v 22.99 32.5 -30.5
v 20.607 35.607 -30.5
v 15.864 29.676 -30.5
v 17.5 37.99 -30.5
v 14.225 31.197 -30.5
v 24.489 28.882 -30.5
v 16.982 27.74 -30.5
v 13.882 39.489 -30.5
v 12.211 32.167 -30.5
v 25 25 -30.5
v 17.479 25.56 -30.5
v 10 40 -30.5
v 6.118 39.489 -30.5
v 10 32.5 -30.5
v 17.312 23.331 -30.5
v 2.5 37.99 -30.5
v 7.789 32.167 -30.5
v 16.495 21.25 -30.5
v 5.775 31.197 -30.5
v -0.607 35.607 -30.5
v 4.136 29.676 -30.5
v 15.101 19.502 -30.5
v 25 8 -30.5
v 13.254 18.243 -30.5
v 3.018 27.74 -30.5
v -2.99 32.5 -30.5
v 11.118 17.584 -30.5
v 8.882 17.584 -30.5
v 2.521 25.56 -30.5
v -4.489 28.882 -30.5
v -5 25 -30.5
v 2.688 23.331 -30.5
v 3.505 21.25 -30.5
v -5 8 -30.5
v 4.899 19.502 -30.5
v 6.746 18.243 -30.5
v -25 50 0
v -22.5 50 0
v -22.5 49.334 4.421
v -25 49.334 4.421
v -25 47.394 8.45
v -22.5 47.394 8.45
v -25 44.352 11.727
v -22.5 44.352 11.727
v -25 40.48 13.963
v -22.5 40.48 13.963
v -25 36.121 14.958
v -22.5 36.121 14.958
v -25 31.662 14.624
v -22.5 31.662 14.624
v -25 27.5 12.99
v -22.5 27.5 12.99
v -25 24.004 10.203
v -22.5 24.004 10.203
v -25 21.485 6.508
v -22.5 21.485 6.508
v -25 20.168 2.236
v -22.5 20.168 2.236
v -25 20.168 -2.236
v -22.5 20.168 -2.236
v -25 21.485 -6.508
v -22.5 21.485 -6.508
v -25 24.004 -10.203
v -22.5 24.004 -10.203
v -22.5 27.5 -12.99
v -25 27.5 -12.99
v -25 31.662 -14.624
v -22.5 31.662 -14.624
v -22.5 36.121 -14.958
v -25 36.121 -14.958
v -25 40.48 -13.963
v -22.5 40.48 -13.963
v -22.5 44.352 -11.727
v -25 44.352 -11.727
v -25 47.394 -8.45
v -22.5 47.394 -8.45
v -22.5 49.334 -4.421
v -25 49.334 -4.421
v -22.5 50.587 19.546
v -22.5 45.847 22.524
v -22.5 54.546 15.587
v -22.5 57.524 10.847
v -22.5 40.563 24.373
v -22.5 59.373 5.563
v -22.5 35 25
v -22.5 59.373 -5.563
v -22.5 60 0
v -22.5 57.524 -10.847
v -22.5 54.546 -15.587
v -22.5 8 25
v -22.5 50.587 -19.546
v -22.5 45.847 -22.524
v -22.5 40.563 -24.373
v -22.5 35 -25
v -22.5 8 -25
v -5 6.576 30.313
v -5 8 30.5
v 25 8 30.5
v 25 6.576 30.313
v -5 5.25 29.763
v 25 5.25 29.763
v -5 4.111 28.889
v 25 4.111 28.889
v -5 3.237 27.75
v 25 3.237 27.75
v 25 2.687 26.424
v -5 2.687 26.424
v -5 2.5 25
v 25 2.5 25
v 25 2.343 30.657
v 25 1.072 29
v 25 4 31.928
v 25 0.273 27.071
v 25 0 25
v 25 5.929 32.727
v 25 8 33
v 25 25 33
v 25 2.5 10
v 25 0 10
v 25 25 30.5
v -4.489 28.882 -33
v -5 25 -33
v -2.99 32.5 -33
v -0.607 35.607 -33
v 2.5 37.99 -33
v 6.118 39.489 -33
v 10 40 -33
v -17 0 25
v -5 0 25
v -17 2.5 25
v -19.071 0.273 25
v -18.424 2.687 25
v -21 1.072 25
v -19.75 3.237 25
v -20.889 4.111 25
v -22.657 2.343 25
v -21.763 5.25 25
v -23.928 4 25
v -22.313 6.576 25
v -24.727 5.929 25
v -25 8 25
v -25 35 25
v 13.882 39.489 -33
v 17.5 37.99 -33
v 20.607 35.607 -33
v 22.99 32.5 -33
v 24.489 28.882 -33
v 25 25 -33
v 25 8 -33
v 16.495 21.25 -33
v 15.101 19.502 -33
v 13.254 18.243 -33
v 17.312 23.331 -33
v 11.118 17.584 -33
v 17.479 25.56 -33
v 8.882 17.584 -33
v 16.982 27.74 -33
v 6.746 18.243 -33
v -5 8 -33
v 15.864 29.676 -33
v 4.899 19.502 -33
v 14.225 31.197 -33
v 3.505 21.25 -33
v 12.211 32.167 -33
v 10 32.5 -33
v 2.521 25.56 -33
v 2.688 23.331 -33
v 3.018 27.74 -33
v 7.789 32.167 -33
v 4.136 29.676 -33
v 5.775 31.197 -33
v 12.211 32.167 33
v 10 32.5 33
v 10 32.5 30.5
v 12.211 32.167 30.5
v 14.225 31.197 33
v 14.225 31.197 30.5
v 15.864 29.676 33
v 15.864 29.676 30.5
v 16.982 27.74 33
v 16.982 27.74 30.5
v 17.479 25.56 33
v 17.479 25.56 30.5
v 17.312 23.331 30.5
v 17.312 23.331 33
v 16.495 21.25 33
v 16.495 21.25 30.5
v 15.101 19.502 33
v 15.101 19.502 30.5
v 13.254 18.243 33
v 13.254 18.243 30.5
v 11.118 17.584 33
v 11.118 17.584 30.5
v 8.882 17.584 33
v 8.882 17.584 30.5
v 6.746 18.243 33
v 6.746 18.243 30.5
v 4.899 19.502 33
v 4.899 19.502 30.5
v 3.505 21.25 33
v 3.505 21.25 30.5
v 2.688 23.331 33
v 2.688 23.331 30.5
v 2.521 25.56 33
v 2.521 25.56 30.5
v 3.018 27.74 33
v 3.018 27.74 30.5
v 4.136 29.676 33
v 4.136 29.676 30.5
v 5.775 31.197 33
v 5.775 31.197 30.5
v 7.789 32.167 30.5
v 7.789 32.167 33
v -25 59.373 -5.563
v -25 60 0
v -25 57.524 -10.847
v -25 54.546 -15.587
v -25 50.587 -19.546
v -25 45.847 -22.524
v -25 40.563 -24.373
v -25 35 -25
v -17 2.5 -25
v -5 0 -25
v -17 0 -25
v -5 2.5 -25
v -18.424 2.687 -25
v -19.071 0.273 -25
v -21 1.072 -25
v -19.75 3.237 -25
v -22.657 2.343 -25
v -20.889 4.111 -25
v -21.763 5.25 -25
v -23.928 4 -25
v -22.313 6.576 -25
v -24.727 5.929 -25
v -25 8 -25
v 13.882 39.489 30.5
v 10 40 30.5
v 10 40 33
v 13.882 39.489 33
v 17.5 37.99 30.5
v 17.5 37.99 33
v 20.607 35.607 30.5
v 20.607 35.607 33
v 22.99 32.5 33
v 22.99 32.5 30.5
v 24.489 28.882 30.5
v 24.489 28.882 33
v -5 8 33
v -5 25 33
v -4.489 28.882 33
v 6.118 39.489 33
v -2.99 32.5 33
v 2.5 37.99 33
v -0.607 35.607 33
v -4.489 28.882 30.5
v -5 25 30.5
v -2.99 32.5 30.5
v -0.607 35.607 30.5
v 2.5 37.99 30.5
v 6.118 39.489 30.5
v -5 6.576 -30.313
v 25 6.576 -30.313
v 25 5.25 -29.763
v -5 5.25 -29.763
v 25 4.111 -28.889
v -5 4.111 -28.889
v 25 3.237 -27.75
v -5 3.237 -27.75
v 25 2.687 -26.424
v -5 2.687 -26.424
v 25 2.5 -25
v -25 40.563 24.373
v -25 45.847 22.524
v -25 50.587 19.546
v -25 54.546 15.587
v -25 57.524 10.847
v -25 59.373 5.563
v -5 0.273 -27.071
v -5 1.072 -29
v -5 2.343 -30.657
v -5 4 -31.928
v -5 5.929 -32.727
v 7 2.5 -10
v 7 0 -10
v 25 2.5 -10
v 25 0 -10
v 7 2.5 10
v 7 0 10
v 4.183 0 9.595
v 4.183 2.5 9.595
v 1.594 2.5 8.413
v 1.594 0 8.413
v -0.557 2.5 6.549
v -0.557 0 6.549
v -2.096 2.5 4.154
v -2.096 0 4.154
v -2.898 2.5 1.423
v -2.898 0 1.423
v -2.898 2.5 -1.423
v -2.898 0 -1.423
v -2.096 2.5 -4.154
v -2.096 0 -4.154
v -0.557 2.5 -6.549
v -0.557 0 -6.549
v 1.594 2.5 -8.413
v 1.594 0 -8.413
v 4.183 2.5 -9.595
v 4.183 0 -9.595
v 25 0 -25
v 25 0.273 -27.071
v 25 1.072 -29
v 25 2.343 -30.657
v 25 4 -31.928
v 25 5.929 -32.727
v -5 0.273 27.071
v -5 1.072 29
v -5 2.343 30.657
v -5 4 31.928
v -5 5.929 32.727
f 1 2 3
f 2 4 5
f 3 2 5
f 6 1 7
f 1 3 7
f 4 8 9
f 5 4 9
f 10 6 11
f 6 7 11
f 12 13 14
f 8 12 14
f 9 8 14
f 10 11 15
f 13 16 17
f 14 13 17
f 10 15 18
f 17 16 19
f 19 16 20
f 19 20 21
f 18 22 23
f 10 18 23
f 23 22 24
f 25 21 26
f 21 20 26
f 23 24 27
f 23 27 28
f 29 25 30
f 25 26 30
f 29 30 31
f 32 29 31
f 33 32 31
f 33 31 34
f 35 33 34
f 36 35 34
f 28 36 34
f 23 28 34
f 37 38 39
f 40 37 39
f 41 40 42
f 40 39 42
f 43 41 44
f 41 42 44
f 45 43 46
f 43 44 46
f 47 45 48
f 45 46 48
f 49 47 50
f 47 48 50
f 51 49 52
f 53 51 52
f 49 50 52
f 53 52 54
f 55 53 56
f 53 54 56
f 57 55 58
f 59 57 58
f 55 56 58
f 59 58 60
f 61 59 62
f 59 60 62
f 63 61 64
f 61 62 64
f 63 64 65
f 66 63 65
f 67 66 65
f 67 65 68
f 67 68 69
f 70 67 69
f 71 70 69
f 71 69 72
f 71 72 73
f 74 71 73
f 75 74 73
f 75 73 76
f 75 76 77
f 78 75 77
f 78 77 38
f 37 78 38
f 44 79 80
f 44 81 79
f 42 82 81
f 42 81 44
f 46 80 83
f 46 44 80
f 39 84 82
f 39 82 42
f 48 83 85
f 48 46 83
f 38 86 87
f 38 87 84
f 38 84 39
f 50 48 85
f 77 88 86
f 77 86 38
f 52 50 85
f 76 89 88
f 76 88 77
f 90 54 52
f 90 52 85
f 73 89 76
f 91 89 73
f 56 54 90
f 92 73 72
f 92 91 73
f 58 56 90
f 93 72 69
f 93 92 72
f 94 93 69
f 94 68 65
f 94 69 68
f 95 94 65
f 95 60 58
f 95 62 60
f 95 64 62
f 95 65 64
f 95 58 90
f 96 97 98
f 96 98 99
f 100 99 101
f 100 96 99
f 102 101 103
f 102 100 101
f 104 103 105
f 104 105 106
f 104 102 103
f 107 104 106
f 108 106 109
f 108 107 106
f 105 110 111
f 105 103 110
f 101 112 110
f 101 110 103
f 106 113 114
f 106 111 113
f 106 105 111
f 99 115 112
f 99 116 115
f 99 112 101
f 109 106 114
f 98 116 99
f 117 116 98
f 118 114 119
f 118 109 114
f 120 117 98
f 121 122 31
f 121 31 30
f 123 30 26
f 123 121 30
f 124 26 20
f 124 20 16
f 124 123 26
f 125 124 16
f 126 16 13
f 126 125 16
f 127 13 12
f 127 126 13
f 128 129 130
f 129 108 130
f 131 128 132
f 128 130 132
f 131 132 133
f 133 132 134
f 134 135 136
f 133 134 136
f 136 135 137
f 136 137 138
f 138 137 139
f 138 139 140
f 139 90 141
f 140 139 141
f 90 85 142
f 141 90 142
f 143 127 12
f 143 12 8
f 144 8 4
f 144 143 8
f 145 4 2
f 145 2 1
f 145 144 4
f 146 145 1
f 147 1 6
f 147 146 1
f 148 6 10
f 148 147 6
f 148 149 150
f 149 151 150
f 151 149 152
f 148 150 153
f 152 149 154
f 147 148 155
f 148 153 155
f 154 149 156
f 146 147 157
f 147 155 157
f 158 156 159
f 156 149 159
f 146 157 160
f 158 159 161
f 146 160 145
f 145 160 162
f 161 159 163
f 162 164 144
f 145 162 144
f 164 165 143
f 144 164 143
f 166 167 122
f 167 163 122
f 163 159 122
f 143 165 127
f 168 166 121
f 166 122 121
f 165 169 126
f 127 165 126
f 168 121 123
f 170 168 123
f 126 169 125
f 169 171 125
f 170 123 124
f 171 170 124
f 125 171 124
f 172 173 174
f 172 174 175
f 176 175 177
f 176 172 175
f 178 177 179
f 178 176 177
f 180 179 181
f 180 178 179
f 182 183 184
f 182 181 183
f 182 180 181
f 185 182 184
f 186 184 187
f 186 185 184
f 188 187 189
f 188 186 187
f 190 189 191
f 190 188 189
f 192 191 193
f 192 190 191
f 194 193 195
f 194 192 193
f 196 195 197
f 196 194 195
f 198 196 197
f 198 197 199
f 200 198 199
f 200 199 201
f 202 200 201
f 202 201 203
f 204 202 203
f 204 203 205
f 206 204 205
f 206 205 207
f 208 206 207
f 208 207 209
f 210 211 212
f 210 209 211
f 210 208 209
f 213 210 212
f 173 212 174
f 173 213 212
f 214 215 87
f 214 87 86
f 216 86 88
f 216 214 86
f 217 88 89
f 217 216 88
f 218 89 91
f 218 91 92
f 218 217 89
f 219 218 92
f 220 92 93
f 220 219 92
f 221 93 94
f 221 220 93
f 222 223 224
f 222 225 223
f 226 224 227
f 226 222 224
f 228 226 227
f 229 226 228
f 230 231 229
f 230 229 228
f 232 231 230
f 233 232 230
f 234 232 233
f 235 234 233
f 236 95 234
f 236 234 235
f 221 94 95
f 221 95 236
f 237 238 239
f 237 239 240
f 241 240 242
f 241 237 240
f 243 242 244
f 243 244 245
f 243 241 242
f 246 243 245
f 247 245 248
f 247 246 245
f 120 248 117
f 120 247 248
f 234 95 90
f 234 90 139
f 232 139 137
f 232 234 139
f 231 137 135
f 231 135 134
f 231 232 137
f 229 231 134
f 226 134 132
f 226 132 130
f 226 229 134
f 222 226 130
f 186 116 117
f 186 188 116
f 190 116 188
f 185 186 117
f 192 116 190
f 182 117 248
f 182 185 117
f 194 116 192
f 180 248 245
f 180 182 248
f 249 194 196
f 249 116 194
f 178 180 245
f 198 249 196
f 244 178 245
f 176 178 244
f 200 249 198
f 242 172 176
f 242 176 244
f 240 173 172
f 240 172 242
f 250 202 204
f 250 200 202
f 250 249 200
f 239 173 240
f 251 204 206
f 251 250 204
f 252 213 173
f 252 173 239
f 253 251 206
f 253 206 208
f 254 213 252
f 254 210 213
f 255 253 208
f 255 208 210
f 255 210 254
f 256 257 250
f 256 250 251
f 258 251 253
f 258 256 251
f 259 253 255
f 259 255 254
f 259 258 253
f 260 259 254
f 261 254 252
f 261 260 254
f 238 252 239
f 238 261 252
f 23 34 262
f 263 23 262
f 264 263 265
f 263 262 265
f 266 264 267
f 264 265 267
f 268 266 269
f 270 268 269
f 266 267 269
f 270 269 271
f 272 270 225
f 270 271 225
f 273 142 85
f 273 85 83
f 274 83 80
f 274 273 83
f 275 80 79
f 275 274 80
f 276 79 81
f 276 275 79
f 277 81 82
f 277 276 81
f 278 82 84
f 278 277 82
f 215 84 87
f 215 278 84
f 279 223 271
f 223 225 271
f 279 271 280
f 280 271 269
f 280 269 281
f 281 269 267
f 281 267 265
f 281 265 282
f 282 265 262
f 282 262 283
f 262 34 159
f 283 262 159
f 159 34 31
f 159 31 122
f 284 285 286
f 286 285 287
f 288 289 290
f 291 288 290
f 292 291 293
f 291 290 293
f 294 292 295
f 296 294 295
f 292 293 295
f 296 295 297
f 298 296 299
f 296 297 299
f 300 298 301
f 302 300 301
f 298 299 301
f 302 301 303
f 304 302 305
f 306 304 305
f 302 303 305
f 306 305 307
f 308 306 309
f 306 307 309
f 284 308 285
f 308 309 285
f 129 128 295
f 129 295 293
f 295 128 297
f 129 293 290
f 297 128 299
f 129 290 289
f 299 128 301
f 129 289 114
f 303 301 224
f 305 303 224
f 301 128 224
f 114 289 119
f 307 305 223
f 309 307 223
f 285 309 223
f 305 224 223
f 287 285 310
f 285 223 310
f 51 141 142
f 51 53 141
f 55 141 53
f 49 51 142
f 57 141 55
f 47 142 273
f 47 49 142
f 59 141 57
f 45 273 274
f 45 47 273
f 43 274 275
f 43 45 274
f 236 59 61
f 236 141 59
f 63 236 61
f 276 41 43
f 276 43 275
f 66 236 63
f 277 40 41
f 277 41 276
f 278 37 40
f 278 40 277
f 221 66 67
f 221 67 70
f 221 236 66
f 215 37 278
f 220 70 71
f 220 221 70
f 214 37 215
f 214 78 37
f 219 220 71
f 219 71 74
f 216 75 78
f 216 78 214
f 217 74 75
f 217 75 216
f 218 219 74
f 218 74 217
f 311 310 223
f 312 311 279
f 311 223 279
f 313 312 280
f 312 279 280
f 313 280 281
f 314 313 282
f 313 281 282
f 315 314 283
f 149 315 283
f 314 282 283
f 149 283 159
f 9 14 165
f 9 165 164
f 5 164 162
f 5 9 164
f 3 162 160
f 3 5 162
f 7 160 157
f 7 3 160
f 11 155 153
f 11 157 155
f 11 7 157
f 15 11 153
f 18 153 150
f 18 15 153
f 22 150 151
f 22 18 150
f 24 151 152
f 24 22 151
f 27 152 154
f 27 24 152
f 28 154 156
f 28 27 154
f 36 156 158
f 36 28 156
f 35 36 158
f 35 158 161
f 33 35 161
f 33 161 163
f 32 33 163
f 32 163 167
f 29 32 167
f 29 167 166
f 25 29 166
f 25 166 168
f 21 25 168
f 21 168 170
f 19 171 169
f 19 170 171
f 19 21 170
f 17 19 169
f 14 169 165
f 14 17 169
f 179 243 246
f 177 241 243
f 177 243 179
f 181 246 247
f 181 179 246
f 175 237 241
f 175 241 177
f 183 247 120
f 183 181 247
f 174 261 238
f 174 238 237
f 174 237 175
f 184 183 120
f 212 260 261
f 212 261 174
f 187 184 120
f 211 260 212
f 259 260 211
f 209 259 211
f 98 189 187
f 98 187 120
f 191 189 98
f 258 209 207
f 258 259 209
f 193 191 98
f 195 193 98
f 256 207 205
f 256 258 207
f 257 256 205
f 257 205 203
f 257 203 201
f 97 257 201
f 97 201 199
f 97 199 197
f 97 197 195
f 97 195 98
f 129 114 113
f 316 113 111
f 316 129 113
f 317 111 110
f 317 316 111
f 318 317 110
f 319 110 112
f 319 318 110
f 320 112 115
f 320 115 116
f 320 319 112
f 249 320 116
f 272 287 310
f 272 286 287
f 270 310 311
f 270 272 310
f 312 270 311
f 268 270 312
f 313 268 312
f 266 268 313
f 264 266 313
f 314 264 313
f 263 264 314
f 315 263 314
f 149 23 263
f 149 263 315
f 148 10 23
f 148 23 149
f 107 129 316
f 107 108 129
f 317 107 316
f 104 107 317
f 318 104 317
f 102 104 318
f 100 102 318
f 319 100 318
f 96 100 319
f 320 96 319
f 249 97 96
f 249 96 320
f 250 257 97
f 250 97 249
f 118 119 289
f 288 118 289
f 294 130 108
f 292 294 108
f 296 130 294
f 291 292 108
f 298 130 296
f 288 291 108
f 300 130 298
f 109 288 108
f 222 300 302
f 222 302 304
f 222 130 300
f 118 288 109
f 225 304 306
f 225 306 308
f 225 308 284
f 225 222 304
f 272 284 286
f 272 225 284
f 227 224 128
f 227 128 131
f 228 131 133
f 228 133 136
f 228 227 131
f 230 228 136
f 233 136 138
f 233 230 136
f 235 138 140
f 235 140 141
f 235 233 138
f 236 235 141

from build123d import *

# Parameters (mm, degrees)
SKETCH1_W                    = 50
SKETCH1_H                    = 50
BASE_FLANGE1_DEPTH           = 2.5
EDGE_FLANGE1_STRIP_W         = 21
EDGE_FLANGE1_STRIP_H         = 2.5
EDGE_FLANGE1_STRIP_CUT_DEPTH = 50
EDGE_FLANGE1_DEPTH           = 50
BREAK_CORNER1_START          = -25
BREAK_CORNER1_DEPTH          = 2.5
SKETCH9_R                    = 15
CUT_EXTRUDE1_DEPTH           = 10
EDGE_FLANGE2_DEPTH           = 30
BREAK_CORNER2_START          = -33
BREAK_CORNER2_DEPTH          = 66
CUT_EXTRUDE2_DEPTH           = 93.633687177
CUT_EXTRUDE2_DEPTH_BACK      = 93.633687177
SKETCH13_R                   = 7.5
CUT_EXTRUDE3_DEPTH           = 71.853722556
CUT_EXTRUDE3_DEPTH_BACK      = 71.853722556


# Read off the part's stored shape, not the designer's step: Break-Corner1, Break-Corner2
# Sheet-metal steps are written as plain solids
with BuildPart() as part:
    # Sketch1 → Base-Flange1 (new body)
    with BuildSketch(Plane(origin=(0, 0, 0), x_dir=(1, 0, 0), z_dir=(0, 1, 0))):
        Rectangle(SKETCH1_W, SKETCH1_H)
    extrude(amount=BASE_FLANGE1_DEPTH)

    # Edge-Flange1 strip (across the edge) → Edge-Flange1 strip cut (cut)
    with BuildSketch(Plane(origin=(-25, 2.5, -25), x_dir=(1, 0, 0), z_dir=(0, 0, 1))):
        with Locations((-2.5, -1.25)):
            Rectangle(EDGE_FLANGE1_STRIP_W, EDGE_FLANGE1_STRIP_H)
    extrude(amount=EDGE_FLANGE1_STRIP_CUT_DEPTH, mode=Mode.SUBTRACT)

    # Edge-Flange1 section (across the edge) → Edge-Flange1 (add)
    with BuildSketch(Plane(origin=(-25, 2.5, -25), x_dir=(1, 0, 0), z_dir=(0, 0, 1))):
        with BuildLine():
            Line((0, 5.5), (0, 57.5))
            Line((0, 57.5), (2.5, 57.5))
            Line((2.5, 57.5), (2.5, 5.5))
            ThreePointArc((2.5, 5.5), (4.110912703, 1.610912703), (8, 0))
            Line((8, 0), (8, -2.5))
            ThreePointArc((8, -2.5), (2.343145751, -0.156854249), (0, 5.5))
        make_face()
    extrude(amount=EDGE_FLANGE1_DEPTH)

    # Break-Corner1 outline → Break-Corner1 (cut)
    with BuildSketch(Plane.YZ.offset(BREAK_CORNER1_START)):
        with BuildLine():
            Line((60, -25), (60, 0))
            ThreePointArc((60, 0), (52.67766953, -17.67766953), (35, -25))
            Line((35, -25), (60, -25))
        make_face()
        with BuildLine():
            ThreePointArc((35, 25), (52.67766953, 17.67766953), (60, 0))
            Line((60, 0), (60, 25))
            Line((60, 25), (35, 25))
        make_face()
    extrude(amount=BREAK_CORNER1_DEPTH, mode=Mode.SUBTRACT)

    # Sketch9 → Cut-Extrude1 (cut)
    with BuildSketch(Plane(origin=(-22.5, 0, 0), x_dir=(0, 0, -1), z_dir=(1, 0, 0))):
        with Locations(Location((0, 35, 0), (0, 0, 90))):
            Circle(SKETCH9_R)
    extrude(amount=-CUT_EXTRUDE1_DEPTH, mode=Mode.SUBTRACT)

    # Edge-Flange2 section (across the edge) → Edge-Flange2 (add)
    with BuildSketch(Plane(origin=(-5, 2.5, 30.5), x_dir=(0, 0, -1), z_dir=(1, 0, 0))):
        with BuildLine():
            Line((-2.5, 5.5), (-2.5, 37.5))
            Line((-2.5, 37.5), (0, 37.5))
            Line((0, 37.5), (0, 5.5))
            ThreePointArc((0, 5.5), (1.610912703, 1.610912703), (5.5, 0))
            Line((5.5, 0), (5.5, -2.5))
            ThreePointArc((5.5, -2.5), (-0.156854249, -0.156854249), (-2.5, 5.5))
        make_face()
    edge_flange2 = extrude(amount=EDGE_FLANGE2_DEPTH)

    # Mirror1: Edge-Flange2 across plane
    add(edge_flange2.mirror(Plane.XY))

    # Break-Corner2 outline → Break-Corner2 (cut)
    with BuildSketch(Plane.XY.offset(BREAK_CORNER2_START)):
        with BuildLine():
            ThreePointArc((-5, 25), (-0.606601718, 35.606601718), (10, 40))
            Line((10, 40), (-5, 40))
            Line((-5, 40), (-5, 25))
        make_face()
        with BuildLine():
            ThreePointArc((10, 40), (20.606601718, 35.606601718), (25, 25))
            Line((25, 25), (25, 40))
            Line((25, 40), (10, 40))
        make_face()
    extrude(amount=BREAK_CORNER2_DEPTH, mode=Mode.SUBTRACT)

    # Sketch13 → Cut-Extrude2 (cut, two sides: drawn at the far end of the back side and taken through both)
    with BuildSketch(Plane(origin=(0, 0, -33), x_dir=(-1, 0, 0), z_dir=(0, 0, -1)).offset(-CUT_EXTRUDE2_DEPTH_BACK)):
        with Locations(Location((-10, 25, 0), (0, 0, 90))):
            Circle(SKETCH13_R)
    extrude(amount=CUT_EXTRUDE2_DEPTH + CUT_EXTRUDE2_DEPTH_BACK, mode=Mode.SUBTRACT)

    # Sketch14 → Cut-Extrude3 (cut, two sides: drawn at the far end of the back side and taken through both)
    with BuildSketch(Plane(origin=(0, 2.5, 0), x_dir=(1, 0, 0), z_dir=(0, 1, 0)).offset(-CUT_EXTRUDE3_DEPTH_BACK)):
        with BuildLine():
            Line((7, 10), (37.302325581, 10))
            ThreePointArc((37.302325581, 10), (47.302325581, 0), (37.302325581, -10))
            Line((37.302325581, -10), (7, -10))
            ThreePointArc((7, -10), (-3, 0), (7, 10))
        make_face()
    extrude(amount=CUT_EXTRUDE3_DEPTH + CUT_EXTRUDE3_DEPTH_BACK, mode=Mode.SUBTRACT)


solid = part.part
